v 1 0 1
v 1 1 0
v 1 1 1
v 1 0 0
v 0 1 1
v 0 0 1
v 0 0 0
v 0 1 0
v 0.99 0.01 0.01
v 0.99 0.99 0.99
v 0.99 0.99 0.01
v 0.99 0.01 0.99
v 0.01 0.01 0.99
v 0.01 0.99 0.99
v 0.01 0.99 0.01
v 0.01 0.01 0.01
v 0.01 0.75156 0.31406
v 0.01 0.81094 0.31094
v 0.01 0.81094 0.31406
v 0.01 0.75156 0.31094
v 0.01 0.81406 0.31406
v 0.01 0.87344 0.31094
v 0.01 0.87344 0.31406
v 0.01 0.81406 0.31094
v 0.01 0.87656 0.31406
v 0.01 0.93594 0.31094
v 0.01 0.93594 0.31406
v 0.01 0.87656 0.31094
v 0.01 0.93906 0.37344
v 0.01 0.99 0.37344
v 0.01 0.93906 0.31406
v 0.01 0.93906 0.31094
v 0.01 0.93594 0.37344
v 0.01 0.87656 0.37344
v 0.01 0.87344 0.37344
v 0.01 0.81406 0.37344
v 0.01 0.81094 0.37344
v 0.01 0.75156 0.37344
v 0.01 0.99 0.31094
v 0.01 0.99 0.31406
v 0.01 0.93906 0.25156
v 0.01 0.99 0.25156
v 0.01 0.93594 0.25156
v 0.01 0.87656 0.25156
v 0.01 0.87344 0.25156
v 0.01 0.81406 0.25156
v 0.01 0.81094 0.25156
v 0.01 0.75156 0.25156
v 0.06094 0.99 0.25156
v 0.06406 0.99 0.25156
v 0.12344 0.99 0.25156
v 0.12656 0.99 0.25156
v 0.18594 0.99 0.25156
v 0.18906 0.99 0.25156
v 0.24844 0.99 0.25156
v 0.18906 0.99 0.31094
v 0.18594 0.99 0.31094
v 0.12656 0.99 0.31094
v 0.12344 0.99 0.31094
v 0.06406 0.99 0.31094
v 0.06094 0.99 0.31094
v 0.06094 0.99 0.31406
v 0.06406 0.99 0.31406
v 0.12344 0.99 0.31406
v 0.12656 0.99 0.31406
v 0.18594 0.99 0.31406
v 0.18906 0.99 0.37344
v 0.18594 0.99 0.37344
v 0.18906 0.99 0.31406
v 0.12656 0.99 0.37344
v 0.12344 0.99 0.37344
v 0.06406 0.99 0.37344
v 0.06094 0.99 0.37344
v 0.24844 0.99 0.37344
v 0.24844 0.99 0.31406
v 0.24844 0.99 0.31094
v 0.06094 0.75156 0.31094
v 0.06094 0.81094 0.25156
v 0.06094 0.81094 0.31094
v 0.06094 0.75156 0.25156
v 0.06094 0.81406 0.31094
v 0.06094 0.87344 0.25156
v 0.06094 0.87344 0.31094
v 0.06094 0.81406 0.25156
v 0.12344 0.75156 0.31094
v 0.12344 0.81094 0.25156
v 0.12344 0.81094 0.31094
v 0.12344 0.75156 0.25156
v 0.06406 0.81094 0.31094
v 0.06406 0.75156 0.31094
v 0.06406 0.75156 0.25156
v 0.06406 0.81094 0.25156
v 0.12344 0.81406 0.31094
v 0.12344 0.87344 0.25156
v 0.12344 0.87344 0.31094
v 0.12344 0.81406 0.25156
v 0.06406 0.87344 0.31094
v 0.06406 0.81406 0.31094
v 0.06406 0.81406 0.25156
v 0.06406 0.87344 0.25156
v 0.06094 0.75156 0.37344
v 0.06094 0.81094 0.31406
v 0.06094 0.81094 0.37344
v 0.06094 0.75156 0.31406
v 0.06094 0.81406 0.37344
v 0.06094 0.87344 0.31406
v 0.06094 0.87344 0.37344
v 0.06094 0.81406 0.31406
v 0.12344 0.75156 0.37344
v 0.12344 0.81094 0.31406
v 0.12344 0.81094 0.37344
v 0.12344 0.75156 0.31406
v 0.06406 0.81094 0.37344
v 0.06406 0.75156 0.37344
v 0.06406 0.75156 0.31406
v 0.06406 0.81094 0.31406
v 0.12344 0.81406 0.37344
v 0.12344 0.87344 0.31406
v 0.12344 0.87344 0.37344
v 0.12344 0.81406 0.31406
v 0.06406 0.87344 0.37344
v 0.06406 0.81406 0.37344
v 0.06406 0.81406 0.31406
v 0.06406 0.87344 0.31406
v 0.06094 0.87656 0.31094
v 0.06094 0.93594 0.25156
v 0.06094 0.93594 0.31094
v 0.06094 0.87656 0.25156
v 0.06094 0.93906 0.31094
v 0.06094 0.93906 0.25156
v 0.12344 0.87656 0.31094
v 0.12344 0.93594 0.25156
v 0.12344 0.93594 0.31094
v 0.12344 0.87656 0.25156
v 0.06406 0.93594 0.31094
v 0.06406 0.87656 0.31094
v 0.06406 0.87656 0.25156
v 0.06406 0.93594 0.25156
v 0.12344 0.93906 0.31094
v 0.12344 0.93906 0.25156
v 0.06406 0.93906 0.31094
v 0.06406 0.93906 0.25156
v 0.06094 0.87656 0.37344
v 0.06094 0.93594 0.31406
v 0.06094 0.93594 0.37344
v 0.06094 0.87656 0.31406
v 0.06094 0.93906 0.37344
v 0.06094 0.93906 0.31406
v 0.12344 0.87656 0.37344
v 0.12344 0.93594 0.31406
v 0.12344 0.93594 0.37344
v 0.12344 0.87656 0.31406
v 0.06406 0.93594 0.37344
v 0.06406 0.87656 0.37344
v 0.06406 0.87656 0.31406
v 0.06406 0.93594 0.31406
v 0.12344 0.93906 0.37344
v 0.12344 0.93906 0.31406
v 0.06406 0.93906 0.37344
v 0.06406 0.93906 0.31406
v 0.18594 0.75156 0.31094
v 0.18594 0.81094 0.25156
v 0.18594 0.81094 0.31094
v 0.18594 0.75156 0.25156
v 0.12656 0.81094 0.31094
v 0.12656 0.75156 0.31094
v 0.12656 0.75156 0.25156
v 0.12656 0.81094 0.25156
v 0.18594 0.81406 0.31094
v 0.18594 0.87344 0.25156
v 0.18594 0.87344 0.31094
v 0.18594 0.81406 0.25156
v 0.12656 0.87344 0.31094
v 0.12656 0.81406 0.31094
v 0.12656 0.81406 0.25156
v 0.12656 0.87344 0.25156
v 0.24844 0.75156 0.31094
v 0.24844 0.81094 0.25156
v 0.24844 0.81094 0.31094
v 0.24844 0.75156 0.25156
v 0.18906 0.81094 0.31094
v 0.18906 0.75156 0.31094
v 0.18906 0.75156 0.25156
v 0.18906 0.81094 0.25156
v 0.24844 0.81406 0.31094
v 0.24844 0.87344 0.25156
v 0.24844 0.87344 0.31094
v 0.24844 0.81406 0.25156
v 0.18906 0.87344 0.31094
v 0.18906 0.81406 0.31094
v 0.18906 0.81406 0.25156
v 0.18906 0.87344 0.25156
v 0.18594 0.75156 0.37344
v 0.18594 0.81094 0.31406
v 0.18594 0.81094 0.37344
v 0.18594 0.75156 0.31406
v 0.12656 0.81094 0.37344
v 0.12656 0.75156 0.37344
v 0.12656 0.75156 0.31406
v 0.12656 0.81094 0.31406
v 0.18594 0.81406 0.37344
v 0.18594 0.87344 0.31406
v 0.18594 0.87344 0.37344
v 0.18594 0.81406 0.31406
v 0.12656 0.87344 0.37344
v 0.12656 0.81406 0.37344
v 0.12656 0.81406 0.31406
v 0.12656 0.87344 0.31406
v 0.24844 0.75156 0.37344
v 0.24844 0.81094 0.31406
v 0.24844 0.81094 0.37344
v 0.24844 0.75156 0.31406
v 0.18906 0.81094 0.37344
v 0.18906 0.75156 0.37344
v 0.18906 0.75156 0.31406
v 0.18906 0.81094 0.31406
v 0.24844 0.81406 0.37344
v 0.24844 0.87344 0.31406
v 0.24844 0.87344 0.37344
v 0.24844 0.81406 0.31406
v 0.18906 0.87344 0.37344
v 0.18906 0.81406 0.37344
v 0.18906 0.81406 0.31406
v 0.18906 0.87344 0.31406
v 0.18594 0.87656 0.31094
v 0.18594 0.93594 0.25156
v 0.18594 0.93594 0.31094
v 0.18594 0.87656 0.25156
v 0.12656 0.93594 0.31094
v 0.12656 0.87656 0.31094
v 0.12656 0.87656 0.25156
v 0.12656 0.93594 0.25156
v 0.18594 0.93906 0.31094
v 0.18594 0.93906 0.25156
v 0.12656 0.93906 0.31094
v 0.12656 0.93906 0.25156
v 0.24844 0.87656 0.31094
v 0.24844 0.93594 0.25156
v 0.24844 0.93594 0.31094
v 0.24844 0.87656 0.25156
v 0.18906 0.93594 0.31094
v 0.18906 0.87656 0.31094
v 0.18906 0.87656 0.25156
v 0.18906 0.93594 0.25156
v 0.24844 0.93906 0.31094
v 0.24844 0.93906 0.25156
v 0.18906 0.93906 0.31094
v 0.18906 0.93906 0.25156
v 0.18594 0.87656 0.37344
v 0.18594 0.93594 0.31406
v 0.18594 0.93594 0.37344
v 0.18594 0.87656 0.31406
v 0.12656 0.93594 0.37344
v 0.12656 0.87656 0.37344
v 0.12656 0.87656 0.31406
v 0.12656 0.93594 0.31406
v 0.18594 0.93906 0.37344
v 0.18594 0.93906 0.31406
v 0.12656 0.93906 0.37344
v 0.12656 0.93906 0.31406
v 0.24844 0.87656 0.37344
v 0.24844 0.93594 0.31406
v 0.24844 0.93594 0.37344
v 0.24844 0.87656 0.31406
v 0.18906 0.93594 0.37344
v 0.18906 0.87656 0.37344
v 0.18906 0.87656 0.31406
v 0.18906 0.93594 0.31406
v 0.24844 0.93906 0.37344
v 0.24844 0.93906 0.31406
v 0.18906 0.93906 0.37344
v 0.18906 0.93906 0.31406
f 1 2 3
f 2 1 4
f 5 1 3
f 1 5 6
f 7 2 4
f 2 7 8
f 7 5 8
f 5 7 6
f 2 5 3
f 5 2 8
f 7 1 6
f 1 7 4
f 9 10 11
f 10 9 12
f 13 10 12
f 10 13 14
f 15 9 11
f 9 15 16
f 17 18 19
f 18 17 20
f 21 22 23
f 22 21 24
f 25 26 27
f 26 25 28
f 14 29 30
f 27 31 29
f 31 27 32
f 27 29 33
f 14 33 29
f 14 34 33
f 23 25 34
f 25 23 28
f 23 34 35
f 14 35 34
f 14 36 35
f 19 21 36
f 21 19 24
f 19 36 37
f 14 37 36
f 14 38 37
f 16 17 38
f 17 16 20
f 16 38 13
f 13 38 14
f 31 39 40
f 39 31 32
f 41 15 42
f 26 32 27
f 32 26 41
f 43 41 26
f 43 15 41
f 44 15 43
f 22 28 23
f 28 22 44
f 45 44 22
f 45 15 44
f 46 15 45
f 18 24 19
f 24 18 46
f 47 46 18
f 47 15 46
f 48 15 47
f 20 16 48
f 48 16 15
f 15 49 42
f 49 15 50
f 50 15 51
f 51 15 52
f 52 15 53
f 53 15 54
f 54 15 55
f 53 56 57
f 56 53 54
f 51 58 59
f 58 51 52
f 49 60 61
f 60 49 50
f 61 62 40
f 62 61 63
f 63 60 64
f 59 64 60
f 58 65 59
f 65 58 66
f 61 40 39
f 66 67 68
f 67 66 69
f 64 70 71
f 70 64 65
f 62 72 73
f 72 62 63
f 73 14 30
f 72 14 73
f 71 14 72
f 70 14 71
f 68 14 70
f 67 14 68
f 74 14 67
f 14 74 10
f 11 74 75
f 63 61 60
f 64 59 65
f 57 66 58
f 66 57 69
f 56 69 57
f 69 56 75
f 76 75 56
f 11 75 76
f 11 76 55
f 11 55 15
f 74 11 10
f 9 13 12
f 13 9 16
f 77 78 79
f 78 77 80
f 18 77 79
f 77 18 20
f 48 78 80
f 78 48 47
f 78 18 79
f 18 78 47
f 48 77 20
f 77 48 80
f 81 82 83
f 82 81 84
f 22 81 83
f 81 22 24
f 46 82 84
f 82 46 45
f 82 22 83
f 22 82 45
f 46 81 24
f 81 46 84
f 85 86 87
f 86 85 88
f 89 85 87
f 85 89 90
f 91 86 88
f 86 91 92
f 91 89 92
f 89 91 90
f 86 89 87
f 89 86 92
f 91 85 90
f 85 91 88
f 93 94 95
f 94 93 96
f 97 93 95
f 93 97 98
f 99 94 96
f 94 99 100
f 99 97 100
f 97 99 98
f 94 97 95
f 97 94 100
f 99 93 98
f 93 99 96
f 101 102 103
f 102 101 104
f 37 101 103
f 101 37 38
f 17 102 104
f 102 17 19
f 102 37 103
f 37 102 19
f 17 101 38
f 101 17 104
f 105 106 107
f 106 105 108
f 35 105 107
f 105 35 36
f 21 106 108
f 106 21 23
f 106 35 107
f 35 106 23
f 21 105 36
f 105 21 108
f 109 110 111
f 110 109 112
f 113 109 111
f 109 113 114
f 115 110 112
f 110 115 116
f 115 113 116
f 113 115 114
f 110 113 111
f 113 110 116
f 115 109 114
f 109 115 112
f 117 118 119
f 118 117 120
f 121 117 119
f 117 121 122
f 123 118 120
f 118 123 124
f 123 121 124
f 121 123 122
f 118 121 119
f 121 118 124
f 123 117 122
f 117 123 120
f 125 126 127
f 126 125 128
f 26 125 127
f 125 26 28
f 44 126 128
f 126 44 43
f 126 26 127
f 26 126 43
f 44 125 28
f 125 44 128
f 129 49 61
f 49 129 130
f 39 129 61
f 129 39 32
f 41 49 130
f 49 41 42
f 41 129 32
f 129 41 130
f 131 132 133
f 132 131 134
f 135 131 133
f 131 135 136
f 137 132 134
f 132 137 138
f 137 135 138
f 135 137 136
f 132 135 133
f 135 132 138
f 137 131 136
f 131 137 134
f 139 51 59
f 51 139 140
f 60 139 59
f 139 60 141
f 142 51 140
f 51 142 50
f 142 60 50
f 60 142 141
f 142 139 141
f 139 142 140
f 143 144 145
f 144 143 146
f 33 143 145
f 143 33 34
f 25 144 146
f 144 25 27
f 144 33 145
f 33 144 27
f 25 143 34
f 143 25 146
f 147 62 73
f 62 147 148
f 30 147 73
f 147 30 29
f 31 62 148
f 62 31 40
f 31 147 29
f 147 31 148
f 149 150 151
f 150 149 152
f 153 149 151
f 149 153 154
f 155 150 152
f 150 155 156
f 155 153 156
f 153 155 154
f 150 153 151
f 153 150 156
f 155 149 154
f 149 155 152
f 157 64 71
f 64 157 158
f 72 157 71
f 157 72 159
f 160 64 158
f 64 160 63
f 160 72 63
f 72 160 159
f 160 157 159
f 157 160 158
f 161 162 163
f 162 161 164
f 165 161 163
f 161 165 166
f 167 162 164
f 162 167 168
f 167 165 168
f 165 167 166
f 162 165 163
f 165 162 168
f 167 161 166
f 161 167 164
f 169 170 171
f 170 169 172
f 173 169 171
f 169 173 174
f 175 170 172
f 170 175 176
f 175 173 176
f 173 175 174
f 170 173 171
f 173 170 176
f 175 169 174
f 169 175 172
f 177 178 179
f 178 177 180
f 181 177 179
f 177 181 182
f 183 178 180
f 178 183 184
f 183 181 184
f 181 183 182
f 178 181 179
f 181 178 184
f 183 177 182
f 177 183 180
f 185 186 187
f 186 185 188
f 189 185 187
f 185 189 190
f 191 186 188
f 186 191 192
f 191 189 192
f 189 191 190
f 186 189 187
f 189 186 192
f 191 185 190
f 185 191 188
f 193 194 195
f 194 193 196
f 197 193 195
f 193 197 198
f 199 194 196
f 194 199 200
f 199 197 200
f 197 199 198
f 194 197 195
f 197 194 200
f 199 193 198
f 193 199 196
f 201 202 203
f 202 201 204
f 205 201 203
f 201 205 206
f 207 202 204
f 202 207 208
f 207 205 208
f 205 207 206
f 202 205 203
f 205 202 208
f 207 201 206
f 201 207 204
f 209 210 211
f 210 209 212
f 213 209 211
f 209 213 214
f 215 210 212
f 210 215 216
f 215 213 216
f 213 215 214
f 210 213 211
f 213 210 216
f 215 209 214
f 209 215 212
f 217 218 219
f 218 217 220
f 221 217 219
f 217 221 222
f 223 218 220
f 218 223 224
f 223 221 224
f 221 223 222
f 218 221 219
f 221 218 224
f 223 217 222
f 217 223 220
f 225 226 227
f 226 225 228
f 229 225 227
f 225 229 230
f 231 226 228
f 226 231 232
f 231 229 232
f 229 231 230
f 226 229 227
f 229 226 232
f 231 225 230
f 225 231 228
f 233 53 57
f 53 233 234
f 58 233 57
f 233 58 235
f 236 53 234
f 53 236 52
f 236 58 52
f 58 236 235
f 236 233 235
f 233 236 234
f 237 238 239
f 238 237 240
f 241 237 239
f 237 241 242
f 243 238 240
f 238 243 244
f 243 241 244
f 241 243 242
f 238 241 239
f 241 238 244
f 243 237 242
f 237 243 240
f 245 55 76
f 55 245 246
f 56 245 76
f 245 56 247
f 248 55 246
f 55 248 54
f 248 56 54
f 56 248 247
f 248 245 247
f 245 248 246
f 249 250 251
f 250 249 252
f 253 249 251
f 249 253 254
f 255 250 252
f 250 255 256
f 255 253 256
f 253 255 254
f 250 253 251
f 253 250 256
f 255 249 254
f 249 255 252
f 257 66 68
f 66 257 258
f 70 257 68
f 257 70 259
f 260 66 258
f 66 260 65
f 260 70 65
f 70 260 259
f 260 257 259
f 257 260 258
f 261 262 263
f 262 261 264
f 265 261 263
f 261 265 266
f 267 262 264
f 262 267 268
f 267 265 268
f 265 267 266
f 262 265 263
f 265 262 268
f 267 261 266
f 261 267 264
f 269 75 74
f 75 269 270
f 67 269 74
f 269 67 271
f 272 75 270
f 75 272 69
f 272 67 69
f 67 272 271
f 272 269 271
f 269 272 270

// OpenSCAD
translate([0.03125, 0.78125, 0.28125]) color([0.2900989154375855, 0.4799983707352583, 0.7775393964930869]) cube([0.059375, 0.059375, 0.059375], center=true);
translate([0.03125, 0.84375, 0.28125]) color([0.9388082122897282, 0.038854283444424764, 0.9925655674013534]) cube([0.059375, 0.059375, 0.059375], center=true);
translate([0.09375, 0.78125, 0.28125]) color([0.44170260534215255, 0.5087868714146372, 0.3598719796518973]) cube([0.059375, 0.059375, 0.059375], center=true);
translate([0.09375, 0.84375, 0.28125]) color([0.18460354523301148, 0.44970120413659875, 0.6501993296624843]) cube([0.059375, 0.059375, 0.059375], center=true);
translate([0.03125, 0.78125, 0.34375]) color([0.3403487699834433, 0.7817731397512809, 0.9743292711922114]) cube([0.059375, 0.059375, 0.059375], center=true);
translate([0.03125, 0.84375, 0.34375]) color([0.5879067123776442, 0.7644126763156446, 0.4000601250473008]) cube([0.059375, 0.059375, 0.059375], center=true);
translate([0.09375, 0.78125, 0.34375]) color([0.36604355066630223, 0.49574653220142006, 0.2571489256046471]) cube([0.059375, 0.059375, 0.059375], center=true);
translate([0.09375, 0.84375, 0.34375]) color([0.8374632643388946, 0.9805052880896761, 0.7293080884755028]) cube([0.059375, 0.059375, 0.059375], center=true);
translate([0.03125, 0.90625, 0.28125]) color([0.7102462781470706, 0.33116367429719706, 0.8694016796882821]) cube([0.059375, 0.059375, 0.059375], center=true);
translate([0.03125, 0.96875, 0.28125]) color([0.15926942089300955, 0.6020328264740608, 0.3939291367673188]) cube([0.059375, 0.059375, 0.059375], center=true);
translate([0.09375, 0.90625, 0.28125]) color([0.17107948370632353, 0.5511468417605202, 0.6362547263976265]) cube([0.059375, 0.059375, 0.059375], center=true);
translate([0.09375, 0.96875, 0.28125]) color([0.4513488113702364, 0.4273913195858777, 0.7941595965619336]) cube([0.059375, 0.059375, 0.059375], center=true);
translate([0.03125, 0.90625, 0.34375]) color([0.250259319804494, 0.668466334841109, 0.9558425975622227]) cube([0.059375, 0.059375, 0.059375], center=true);
translate([0.03125, 0.96875, 0.34375]) color([0.8787840809996866, 0.7297949922477387, 0.6760701789099856]) cube([0.059375, 0.059375, 0.059375], center=true);
translate([0.09375, 0.90625, 0.34375]) color([0.12178286062576871, 0.34347709882143906, 0.3138882056823582]) cube([0.059375, 0.059375, 0.059375], center=true);
translate([0.09375, 0.96875, 0.34375]) color([0.8256958180770725, 0.5497988063064695, 0.5224418814286286]) cube([0.059375, 0.059375, 0.059375], center=true);
translate([0.15625, 0.78125, 0.28125]) color([0.8667571418796679, 0.1657379622209173, 0.34152302129198175]) cube([0.059375, 0.059375, 0.059375], center=true);
translate([0.15625, 0.84375, 0.28125]) color([0.4966795782970417, 0.4682540107735893, 0.7143441099210599]) cube([0.059375, 0.059375, 0.059375], center=true);
translate([0.21875, 0.78125, 0.28125]) color([0.6794769624286241, 0.9778011538649698, 0.6956985505223239]) cube([0.059375, 0.059375, 0.059375], center=true);
translate([0.21875, 0.84375, 0.28125]) color([0.049848449837082254, 0.7040255102812552, 0.23502660225710548]) cube([0.059375, 0.059375, 0.059375], center=true);
translate([0.15625, 0.78125, 0.34375]) color([0.2192232268137776, 0.25394565558833193, 0.7470066807227207]) cube([0.059375, 0.059375, 0.059375], center=true);
translate([0.15625, 0.84375, 0.34375]) color([0.4970273434949305, 0.6457861570741659, 0.6123610041545314]) cube([0.059375, 0.059375, 0.059375], center=true);
translate([0.21875, 0.78125, 0.34375]) color([0.3147608560008942, 0.21779972321877228, 0.08573673877399712]) cube([0.059375, 0.059375, 0.059375], center=true);
translate([0.21875, 0.84375, 0.34375]) color([0.7301345985439462, 0.012122804887951477, 0.9266572233595807]) cube([0.059375, 0.059375, 0.059375], center=true);
translate([0.15625, 0.90625, 0.28125]) color([0.6523783489196855, 0.683096383465323, 0.056707876426240755]) cube([0.059375, 0.059375, 0.059375], center=true);
translate([0.15625, 0.96875, 0.28125]) color([0.9202828421030393, 0.6224283212809713, 0.09884261478876644]) cube([0.059375, 0.059375, 0.059375], center=true);
translate([0.21875, 0.90625, 0.28125]) color([0.5566697210245537, 0.9242411361984193, 0.4493738479545202]) cube([0.059375, 0.059375, 0.059375], center=true);
translate([0.21875, 0.96875, 0.28125]) color([0.9159839408953577, 0.5842491446465958, 0.794562993834622]) cube([0.059375, 0.059375, 0.059375], center=true);
translate([0.15625, 0.90625, 0.34375]) color([0.7628318471167657, 0.678963192096452, 0.8649334958146554]) cube([0.059375, 0.059375, 0.059375], center=true);
translate([0.15625, 0.96875, 0.34375]) color([0.3186621910375238, 0.8354161715679529, 0.826829547153697]) cube([0.059375, 0.059375, 0.059375], center=true);
translate([0.21875, 0.90625, 0.34375]) color([0.11738075374887624, 0.05498692879855205, 0.6720606658768808]) cube([0.059375, 0.059375, 0.059375], center=true);
translate([0.21875, 0.96875, 0.34375]) color([0.48227079704185694, 0.2633045439878229, 0.7871728303492512]) cube([0.059375, 0.059375, 0.059375], center=true);
color([0.3,0.3,0.3,0.3]) difference() { cube([1,1,1]); translate([0.01,0.01,0.01]) cube([0.98,0.98,0.98]); }
